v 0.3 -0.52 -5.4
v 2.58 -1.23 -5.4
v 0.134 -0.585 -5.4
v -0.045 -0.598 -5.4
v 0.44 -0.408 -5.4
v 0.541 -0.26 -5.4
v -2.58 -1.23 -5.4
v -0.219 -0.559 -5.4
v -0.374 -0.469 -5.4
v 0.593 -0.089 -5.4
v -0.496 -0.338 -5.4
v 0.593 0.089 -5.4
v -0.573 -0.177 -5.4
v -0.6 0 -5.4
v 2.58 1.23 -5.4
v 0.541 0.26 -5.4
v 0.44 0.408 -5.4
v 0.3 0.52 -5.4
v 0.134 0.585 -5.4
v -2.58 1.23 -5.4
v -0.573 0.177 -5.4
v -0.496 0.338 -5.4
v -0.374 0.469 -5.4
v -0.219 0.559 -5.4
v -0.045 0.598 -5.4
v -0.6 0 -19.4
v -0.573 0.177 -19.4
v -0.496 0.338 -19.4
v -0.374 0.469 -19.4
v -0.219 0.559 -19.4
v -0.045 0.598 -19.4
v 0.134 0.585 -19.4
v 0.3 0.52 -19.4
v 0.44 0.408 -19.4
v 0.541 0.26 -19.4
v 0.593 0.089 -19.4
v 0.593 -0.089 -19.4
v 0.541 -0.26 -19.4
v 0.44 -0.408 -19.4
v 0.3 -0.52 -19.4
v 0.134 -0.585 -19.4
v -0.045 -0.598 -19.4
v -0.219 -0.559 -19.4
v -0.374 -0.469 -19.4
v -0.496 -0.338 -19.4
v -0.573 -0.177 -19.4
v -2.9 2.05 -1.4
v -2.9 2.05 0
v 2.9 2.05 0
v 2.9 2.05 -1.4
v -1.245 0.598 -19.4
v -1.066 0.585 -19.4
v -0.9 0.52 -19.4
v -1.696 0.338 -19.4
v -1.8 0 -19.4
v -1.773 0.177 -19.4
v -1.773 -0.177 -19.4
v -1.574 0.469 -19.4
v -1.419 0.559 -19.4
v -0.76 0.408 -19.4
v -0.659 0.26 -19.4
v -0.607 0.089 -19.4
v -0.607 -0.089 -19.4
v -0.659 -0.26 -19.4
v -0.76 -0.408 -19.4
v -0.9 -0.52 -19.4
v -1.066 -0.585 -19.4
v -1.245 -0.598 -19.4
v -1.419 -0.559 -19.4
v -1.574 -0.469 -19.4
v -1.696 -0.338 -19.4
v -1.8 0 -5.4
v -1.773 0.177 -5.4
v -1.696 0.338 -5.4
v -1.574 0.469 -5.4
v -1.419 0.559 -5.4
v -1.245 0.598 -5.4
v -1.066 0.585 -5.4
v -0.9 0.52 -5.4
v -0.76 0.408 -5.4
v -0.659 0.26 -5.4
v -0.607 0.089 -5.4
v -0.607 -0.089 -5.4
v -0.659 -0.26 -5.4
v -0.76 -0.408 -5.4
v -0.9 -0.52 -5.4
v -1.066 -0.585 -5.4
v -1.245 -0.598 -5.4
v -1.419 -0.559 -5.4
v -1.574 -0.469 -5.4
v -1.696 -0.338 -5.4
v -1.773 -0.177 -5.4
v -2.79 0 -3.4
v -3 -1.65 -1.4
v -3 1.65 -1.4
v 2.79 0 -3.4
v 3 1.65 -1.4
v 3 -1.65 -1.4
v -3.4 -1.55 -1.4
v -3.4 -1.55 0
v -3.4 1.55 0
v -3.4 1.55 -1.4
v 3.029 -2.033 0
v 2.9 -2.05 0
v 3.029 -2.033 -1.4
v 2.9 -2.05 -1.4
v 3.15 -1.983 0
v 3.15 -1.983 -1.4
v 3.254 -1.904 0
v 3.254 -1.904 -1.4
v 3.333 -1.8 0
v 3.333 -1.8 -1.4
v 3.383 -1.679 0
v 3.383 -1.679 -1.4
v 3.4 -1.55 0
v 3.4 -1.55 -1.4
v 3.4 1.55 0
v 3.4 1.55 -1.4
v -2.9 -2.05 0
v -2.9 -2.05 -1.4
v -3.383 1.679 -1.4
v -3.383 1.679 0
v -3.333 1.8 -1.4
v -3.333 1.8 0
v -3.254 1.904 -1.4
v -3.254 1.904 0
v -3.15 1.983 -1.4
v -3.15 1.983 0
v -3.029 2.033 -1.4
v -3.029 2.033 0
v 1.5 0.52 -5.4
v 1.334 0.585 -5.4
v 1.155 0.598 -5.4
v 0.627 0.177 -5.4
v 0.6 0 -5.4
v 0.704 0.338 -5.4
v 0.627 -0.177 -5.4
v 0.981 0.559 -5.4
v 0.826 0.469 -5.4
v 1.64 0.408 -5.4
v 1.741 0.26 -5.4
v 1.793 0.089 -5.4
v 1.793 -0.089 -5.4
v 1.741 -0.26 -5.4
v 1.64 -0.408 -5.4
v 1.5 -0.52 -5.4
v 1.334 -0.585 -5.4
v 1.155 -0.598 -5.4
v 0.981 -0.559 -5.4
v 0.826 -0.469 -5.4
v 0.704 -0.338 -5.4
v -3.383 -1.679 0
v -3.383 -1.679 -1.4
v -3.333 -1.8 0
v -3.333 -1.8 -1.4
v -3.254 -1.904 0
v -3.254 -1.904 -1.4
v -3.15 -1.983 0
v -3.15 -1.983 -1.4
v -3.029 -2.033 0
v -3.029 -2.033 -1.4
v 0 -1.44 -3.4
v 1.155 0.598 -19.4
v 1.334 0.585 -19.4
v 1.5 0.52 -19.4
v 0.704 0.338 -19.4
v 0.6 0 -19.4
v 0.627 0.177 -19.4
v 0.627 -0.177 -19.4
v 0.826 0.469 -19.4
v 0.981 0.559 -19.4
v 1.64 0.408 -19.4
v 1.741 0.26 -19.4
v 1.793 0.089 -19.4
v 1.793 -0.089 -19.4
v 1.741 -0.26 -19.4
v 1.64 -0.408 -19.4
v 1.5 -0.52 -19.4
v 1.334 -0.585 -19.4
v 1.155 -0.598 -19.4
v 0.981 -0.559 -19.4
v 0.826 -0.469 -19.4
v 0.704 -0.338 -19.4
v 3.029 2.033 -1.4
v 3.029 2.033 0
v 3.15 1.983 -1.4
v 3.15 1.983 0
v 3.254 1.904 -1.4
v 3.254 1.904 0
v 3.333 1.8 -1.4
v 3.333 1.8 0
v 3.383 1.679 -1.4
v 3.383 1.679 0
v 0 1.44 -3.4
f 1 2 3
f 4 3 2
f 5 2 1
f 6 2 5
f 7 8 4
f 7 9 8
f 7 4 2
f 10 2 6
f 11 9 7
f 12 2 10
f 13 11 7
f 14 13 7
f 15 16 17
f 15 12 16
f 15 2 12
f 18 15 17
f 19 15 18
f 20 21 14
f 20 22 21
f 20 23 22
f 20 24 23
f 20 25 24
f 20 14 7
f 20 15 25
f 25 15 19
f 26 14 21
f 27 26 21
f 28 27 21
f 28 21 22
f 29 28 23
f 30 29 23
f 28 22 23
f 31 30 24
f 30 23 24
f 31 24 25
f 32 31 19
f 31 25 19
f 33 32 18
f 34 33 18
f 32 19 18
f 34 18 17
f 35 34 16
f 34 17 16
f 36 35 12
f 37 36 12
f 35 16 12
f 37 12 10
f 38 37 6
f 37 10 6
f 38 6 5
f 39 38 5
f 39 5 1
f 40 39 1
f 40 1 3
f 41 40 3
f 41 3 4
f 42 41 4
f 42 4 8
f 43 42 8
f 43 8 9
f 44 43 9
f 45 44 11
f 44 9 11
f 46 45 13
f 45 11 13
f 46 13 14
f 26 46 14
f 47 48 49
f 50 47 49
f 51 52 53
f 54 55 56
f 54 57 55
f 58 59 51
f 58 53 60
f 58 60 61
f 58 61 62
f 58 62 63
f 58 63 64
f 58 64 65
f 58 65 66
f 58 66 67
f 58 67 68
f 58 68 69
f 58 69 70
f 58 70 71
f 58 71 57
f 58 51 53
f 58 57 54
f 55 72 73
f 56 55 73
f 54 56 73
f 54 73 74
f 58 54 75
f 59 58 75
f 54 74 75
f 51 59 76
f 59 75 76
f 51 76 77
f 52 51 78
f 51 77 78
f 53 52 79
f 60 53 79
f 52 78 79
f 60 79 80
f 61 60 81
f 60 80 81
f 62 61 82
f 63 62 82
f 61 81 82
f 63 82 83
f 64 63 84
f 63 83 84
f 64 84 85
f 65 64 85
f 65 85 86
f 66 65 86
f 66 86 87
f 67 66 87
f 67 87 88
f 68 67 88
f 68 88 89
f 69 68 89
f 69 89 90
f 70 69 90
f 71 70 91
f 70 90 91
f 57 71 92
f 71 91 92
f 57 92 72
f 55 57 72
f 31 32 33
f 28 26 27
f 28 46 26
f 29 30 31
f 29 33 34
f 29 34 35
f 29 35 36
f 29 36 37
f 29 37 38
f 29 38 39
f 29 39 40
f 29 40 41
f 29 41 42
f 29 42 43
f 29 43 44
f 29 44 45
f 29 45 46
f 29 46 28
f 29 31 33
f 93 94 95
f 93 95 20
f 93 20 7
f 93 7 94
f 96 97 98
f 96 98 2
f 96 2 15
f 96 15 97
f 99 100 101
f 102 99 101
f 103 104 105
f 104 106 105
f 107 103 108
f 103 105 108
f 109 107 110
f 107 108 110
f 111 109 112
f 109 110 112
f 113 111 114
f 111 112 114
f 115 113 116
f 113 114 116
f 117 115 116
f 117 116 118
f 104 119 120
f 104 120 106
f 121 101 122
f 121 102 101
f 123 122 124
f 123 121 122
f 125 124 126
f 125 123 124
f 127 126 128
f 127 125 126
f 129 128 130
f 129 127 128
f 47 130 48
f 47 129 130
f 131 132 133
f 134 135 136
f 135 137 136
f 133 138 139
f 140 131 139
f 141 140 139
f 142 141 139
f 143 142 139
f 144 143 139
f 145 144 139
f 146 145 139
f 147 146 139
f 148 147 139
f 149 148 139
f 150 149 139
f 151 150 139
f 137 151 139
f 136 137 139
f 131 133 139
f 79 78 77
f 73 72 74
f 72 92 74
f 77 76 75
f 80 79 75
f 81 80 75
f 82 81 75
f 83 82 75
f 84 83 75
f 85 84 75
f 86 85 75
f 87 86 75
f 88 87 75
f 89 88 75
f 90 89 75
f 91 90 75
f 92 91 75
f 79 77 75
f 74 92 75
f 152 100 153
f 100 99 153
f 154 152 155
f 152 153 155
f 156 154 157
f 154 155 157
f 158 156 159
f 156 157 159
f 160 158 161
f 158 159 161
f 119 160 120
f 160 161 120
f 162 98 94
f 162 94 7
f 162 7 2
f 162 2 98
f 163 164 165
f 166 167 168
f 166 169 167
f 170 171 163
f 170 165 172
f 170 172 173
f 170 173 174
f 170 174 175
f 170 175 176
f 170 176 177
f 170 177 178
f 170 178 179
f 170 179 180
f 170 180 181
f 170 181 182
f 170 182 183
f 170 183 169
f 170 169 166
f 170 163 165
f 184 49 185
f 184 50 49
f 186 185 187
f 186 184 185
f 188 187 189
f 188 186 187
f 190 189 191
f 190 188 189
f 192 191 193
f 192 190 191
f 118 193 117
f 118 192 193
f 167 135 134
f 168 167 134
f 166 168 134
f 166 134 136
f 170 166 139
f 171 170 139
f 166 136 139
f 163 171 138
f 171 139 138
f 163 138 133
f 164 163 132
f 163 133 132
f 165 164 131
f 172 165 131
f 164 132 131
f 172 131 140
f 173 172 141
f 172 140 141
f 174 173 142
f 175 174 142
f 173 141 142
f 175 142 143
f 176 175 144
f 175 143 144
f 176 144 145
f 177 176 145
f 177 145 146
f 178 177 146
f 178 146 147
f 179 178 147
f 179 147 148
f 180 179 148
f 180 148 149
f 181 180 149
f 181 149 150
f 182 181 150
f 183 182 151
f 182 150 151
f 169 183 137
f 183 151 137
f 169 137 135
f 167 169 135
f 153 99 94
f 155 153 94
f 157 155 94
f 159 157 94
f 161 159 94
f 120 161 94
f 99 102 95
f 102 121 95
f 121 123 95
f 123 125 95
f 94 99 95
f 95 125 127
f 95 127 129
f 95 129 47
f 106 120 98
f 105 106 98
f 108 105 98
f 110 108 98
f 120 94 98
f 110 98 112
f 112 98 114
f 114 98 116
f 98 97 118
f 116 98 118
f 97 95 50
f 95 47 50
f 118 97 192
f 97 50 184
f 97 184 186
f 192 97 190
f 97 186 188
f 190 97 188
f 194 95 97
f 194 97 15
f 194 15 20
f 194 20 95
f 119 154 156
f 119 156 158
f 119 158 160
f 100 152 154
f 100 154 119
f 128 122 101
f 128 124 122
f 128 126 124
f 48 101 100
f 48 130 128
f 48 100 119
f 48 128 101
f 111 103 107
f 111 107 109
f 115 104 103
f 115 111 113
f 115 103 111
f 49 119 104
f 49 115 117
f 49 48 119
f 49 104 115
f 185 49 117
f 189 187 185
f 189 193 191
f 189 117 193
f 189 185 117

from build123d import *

# Parameters (mm, degrees)
BASES_W             = 6.8
BASES_H             = 4.1
BASE_DEPTH          = 1.4
EXTENDEDBODYS_W     = 6
EXTENDEDBODYS_H     = 3.3
EXTENDED_BODY_DEPTH = 4
EXTENDED_BODY_TAPER = 6
POSITIVES_R         = 0.6
POSITIVE_DEPTH      = 14
SIGNALS_R           = 0.6
SIGNAL_DEPTH        = 14
NEGATIVES_R         = 0.6
NEGATIVE_DEPTH      = 14
BASE_F_R            = 0.5


with BuildPart() as part:
    # BaseS → BASE (new body)
    with BuildSketch(Plane.XY):
        Rectangle(BASES_W, BASES_H)
    extrude(amount=-BASE_DEPTH)

    # ExtendedBodyS → EXTENDED BODY (add)
    with BuildSketch(Plane(origin=(0, 0, -1.4), x_dir=(-1, 0, 0), z_dir=(0, 0, -1))):
        Rectangle(EXTENDEDBODYS_W, EXTENDEDBODYS_H)
    extrude(amount=EXTENDED_BODY_DEPTH, taper=EXTENDED_BODY_TAPER)

    # PositiveS → POSITIVE (add)
    with BuildSketch(Plane(origin=(0, 0, -5.4), x_dir=(-1, 0, 0), z_dir=(0, 0, -1))):
        Circle(POSITIVES_R)
    extrude(amount=POSITIVE_DEPTH)

    # BASE F
    base_f_edges = [part.edges().sort_by_distance(p)[0] for p in [
        (3.4, -2.05, -0.7),
        (-3.4, -2.05, -0.7),
        (-3.4, 2.05, -0.7),
        (3.4, 2.05, -0.7),
    ]]
    fillet(base_f_edges, radius=BASE_F_R)


with BuildPart() as body_2:
    # SignalS → SIGNAL (new body)
    with BuildSketch(Plane(origin=(0, 0, -5.4), x_dir=(-1, 0, 0), z_dir=(0, 0, -1))):
        with Locations((1.2, 0)):
            Circle(SIGNALS_R)
    extrude(amount=SIGNAL_DEPTH)


with BuildPart() as body_3:
    # NegativeS → NEGATIVE (new body)
    with BuildSketch(Plane(origin=(0, 0, -5.4), x_dir=(-1, 0, 0), z_dir=(0, 0, -1))):
        with Locations((-1.2, 0)):
            Circle(NEGATIVES_R)
    extrude(amount=NEGATIVE_DEPTH)


solid = Compound([part.part, body_2.part, body_3.part])
